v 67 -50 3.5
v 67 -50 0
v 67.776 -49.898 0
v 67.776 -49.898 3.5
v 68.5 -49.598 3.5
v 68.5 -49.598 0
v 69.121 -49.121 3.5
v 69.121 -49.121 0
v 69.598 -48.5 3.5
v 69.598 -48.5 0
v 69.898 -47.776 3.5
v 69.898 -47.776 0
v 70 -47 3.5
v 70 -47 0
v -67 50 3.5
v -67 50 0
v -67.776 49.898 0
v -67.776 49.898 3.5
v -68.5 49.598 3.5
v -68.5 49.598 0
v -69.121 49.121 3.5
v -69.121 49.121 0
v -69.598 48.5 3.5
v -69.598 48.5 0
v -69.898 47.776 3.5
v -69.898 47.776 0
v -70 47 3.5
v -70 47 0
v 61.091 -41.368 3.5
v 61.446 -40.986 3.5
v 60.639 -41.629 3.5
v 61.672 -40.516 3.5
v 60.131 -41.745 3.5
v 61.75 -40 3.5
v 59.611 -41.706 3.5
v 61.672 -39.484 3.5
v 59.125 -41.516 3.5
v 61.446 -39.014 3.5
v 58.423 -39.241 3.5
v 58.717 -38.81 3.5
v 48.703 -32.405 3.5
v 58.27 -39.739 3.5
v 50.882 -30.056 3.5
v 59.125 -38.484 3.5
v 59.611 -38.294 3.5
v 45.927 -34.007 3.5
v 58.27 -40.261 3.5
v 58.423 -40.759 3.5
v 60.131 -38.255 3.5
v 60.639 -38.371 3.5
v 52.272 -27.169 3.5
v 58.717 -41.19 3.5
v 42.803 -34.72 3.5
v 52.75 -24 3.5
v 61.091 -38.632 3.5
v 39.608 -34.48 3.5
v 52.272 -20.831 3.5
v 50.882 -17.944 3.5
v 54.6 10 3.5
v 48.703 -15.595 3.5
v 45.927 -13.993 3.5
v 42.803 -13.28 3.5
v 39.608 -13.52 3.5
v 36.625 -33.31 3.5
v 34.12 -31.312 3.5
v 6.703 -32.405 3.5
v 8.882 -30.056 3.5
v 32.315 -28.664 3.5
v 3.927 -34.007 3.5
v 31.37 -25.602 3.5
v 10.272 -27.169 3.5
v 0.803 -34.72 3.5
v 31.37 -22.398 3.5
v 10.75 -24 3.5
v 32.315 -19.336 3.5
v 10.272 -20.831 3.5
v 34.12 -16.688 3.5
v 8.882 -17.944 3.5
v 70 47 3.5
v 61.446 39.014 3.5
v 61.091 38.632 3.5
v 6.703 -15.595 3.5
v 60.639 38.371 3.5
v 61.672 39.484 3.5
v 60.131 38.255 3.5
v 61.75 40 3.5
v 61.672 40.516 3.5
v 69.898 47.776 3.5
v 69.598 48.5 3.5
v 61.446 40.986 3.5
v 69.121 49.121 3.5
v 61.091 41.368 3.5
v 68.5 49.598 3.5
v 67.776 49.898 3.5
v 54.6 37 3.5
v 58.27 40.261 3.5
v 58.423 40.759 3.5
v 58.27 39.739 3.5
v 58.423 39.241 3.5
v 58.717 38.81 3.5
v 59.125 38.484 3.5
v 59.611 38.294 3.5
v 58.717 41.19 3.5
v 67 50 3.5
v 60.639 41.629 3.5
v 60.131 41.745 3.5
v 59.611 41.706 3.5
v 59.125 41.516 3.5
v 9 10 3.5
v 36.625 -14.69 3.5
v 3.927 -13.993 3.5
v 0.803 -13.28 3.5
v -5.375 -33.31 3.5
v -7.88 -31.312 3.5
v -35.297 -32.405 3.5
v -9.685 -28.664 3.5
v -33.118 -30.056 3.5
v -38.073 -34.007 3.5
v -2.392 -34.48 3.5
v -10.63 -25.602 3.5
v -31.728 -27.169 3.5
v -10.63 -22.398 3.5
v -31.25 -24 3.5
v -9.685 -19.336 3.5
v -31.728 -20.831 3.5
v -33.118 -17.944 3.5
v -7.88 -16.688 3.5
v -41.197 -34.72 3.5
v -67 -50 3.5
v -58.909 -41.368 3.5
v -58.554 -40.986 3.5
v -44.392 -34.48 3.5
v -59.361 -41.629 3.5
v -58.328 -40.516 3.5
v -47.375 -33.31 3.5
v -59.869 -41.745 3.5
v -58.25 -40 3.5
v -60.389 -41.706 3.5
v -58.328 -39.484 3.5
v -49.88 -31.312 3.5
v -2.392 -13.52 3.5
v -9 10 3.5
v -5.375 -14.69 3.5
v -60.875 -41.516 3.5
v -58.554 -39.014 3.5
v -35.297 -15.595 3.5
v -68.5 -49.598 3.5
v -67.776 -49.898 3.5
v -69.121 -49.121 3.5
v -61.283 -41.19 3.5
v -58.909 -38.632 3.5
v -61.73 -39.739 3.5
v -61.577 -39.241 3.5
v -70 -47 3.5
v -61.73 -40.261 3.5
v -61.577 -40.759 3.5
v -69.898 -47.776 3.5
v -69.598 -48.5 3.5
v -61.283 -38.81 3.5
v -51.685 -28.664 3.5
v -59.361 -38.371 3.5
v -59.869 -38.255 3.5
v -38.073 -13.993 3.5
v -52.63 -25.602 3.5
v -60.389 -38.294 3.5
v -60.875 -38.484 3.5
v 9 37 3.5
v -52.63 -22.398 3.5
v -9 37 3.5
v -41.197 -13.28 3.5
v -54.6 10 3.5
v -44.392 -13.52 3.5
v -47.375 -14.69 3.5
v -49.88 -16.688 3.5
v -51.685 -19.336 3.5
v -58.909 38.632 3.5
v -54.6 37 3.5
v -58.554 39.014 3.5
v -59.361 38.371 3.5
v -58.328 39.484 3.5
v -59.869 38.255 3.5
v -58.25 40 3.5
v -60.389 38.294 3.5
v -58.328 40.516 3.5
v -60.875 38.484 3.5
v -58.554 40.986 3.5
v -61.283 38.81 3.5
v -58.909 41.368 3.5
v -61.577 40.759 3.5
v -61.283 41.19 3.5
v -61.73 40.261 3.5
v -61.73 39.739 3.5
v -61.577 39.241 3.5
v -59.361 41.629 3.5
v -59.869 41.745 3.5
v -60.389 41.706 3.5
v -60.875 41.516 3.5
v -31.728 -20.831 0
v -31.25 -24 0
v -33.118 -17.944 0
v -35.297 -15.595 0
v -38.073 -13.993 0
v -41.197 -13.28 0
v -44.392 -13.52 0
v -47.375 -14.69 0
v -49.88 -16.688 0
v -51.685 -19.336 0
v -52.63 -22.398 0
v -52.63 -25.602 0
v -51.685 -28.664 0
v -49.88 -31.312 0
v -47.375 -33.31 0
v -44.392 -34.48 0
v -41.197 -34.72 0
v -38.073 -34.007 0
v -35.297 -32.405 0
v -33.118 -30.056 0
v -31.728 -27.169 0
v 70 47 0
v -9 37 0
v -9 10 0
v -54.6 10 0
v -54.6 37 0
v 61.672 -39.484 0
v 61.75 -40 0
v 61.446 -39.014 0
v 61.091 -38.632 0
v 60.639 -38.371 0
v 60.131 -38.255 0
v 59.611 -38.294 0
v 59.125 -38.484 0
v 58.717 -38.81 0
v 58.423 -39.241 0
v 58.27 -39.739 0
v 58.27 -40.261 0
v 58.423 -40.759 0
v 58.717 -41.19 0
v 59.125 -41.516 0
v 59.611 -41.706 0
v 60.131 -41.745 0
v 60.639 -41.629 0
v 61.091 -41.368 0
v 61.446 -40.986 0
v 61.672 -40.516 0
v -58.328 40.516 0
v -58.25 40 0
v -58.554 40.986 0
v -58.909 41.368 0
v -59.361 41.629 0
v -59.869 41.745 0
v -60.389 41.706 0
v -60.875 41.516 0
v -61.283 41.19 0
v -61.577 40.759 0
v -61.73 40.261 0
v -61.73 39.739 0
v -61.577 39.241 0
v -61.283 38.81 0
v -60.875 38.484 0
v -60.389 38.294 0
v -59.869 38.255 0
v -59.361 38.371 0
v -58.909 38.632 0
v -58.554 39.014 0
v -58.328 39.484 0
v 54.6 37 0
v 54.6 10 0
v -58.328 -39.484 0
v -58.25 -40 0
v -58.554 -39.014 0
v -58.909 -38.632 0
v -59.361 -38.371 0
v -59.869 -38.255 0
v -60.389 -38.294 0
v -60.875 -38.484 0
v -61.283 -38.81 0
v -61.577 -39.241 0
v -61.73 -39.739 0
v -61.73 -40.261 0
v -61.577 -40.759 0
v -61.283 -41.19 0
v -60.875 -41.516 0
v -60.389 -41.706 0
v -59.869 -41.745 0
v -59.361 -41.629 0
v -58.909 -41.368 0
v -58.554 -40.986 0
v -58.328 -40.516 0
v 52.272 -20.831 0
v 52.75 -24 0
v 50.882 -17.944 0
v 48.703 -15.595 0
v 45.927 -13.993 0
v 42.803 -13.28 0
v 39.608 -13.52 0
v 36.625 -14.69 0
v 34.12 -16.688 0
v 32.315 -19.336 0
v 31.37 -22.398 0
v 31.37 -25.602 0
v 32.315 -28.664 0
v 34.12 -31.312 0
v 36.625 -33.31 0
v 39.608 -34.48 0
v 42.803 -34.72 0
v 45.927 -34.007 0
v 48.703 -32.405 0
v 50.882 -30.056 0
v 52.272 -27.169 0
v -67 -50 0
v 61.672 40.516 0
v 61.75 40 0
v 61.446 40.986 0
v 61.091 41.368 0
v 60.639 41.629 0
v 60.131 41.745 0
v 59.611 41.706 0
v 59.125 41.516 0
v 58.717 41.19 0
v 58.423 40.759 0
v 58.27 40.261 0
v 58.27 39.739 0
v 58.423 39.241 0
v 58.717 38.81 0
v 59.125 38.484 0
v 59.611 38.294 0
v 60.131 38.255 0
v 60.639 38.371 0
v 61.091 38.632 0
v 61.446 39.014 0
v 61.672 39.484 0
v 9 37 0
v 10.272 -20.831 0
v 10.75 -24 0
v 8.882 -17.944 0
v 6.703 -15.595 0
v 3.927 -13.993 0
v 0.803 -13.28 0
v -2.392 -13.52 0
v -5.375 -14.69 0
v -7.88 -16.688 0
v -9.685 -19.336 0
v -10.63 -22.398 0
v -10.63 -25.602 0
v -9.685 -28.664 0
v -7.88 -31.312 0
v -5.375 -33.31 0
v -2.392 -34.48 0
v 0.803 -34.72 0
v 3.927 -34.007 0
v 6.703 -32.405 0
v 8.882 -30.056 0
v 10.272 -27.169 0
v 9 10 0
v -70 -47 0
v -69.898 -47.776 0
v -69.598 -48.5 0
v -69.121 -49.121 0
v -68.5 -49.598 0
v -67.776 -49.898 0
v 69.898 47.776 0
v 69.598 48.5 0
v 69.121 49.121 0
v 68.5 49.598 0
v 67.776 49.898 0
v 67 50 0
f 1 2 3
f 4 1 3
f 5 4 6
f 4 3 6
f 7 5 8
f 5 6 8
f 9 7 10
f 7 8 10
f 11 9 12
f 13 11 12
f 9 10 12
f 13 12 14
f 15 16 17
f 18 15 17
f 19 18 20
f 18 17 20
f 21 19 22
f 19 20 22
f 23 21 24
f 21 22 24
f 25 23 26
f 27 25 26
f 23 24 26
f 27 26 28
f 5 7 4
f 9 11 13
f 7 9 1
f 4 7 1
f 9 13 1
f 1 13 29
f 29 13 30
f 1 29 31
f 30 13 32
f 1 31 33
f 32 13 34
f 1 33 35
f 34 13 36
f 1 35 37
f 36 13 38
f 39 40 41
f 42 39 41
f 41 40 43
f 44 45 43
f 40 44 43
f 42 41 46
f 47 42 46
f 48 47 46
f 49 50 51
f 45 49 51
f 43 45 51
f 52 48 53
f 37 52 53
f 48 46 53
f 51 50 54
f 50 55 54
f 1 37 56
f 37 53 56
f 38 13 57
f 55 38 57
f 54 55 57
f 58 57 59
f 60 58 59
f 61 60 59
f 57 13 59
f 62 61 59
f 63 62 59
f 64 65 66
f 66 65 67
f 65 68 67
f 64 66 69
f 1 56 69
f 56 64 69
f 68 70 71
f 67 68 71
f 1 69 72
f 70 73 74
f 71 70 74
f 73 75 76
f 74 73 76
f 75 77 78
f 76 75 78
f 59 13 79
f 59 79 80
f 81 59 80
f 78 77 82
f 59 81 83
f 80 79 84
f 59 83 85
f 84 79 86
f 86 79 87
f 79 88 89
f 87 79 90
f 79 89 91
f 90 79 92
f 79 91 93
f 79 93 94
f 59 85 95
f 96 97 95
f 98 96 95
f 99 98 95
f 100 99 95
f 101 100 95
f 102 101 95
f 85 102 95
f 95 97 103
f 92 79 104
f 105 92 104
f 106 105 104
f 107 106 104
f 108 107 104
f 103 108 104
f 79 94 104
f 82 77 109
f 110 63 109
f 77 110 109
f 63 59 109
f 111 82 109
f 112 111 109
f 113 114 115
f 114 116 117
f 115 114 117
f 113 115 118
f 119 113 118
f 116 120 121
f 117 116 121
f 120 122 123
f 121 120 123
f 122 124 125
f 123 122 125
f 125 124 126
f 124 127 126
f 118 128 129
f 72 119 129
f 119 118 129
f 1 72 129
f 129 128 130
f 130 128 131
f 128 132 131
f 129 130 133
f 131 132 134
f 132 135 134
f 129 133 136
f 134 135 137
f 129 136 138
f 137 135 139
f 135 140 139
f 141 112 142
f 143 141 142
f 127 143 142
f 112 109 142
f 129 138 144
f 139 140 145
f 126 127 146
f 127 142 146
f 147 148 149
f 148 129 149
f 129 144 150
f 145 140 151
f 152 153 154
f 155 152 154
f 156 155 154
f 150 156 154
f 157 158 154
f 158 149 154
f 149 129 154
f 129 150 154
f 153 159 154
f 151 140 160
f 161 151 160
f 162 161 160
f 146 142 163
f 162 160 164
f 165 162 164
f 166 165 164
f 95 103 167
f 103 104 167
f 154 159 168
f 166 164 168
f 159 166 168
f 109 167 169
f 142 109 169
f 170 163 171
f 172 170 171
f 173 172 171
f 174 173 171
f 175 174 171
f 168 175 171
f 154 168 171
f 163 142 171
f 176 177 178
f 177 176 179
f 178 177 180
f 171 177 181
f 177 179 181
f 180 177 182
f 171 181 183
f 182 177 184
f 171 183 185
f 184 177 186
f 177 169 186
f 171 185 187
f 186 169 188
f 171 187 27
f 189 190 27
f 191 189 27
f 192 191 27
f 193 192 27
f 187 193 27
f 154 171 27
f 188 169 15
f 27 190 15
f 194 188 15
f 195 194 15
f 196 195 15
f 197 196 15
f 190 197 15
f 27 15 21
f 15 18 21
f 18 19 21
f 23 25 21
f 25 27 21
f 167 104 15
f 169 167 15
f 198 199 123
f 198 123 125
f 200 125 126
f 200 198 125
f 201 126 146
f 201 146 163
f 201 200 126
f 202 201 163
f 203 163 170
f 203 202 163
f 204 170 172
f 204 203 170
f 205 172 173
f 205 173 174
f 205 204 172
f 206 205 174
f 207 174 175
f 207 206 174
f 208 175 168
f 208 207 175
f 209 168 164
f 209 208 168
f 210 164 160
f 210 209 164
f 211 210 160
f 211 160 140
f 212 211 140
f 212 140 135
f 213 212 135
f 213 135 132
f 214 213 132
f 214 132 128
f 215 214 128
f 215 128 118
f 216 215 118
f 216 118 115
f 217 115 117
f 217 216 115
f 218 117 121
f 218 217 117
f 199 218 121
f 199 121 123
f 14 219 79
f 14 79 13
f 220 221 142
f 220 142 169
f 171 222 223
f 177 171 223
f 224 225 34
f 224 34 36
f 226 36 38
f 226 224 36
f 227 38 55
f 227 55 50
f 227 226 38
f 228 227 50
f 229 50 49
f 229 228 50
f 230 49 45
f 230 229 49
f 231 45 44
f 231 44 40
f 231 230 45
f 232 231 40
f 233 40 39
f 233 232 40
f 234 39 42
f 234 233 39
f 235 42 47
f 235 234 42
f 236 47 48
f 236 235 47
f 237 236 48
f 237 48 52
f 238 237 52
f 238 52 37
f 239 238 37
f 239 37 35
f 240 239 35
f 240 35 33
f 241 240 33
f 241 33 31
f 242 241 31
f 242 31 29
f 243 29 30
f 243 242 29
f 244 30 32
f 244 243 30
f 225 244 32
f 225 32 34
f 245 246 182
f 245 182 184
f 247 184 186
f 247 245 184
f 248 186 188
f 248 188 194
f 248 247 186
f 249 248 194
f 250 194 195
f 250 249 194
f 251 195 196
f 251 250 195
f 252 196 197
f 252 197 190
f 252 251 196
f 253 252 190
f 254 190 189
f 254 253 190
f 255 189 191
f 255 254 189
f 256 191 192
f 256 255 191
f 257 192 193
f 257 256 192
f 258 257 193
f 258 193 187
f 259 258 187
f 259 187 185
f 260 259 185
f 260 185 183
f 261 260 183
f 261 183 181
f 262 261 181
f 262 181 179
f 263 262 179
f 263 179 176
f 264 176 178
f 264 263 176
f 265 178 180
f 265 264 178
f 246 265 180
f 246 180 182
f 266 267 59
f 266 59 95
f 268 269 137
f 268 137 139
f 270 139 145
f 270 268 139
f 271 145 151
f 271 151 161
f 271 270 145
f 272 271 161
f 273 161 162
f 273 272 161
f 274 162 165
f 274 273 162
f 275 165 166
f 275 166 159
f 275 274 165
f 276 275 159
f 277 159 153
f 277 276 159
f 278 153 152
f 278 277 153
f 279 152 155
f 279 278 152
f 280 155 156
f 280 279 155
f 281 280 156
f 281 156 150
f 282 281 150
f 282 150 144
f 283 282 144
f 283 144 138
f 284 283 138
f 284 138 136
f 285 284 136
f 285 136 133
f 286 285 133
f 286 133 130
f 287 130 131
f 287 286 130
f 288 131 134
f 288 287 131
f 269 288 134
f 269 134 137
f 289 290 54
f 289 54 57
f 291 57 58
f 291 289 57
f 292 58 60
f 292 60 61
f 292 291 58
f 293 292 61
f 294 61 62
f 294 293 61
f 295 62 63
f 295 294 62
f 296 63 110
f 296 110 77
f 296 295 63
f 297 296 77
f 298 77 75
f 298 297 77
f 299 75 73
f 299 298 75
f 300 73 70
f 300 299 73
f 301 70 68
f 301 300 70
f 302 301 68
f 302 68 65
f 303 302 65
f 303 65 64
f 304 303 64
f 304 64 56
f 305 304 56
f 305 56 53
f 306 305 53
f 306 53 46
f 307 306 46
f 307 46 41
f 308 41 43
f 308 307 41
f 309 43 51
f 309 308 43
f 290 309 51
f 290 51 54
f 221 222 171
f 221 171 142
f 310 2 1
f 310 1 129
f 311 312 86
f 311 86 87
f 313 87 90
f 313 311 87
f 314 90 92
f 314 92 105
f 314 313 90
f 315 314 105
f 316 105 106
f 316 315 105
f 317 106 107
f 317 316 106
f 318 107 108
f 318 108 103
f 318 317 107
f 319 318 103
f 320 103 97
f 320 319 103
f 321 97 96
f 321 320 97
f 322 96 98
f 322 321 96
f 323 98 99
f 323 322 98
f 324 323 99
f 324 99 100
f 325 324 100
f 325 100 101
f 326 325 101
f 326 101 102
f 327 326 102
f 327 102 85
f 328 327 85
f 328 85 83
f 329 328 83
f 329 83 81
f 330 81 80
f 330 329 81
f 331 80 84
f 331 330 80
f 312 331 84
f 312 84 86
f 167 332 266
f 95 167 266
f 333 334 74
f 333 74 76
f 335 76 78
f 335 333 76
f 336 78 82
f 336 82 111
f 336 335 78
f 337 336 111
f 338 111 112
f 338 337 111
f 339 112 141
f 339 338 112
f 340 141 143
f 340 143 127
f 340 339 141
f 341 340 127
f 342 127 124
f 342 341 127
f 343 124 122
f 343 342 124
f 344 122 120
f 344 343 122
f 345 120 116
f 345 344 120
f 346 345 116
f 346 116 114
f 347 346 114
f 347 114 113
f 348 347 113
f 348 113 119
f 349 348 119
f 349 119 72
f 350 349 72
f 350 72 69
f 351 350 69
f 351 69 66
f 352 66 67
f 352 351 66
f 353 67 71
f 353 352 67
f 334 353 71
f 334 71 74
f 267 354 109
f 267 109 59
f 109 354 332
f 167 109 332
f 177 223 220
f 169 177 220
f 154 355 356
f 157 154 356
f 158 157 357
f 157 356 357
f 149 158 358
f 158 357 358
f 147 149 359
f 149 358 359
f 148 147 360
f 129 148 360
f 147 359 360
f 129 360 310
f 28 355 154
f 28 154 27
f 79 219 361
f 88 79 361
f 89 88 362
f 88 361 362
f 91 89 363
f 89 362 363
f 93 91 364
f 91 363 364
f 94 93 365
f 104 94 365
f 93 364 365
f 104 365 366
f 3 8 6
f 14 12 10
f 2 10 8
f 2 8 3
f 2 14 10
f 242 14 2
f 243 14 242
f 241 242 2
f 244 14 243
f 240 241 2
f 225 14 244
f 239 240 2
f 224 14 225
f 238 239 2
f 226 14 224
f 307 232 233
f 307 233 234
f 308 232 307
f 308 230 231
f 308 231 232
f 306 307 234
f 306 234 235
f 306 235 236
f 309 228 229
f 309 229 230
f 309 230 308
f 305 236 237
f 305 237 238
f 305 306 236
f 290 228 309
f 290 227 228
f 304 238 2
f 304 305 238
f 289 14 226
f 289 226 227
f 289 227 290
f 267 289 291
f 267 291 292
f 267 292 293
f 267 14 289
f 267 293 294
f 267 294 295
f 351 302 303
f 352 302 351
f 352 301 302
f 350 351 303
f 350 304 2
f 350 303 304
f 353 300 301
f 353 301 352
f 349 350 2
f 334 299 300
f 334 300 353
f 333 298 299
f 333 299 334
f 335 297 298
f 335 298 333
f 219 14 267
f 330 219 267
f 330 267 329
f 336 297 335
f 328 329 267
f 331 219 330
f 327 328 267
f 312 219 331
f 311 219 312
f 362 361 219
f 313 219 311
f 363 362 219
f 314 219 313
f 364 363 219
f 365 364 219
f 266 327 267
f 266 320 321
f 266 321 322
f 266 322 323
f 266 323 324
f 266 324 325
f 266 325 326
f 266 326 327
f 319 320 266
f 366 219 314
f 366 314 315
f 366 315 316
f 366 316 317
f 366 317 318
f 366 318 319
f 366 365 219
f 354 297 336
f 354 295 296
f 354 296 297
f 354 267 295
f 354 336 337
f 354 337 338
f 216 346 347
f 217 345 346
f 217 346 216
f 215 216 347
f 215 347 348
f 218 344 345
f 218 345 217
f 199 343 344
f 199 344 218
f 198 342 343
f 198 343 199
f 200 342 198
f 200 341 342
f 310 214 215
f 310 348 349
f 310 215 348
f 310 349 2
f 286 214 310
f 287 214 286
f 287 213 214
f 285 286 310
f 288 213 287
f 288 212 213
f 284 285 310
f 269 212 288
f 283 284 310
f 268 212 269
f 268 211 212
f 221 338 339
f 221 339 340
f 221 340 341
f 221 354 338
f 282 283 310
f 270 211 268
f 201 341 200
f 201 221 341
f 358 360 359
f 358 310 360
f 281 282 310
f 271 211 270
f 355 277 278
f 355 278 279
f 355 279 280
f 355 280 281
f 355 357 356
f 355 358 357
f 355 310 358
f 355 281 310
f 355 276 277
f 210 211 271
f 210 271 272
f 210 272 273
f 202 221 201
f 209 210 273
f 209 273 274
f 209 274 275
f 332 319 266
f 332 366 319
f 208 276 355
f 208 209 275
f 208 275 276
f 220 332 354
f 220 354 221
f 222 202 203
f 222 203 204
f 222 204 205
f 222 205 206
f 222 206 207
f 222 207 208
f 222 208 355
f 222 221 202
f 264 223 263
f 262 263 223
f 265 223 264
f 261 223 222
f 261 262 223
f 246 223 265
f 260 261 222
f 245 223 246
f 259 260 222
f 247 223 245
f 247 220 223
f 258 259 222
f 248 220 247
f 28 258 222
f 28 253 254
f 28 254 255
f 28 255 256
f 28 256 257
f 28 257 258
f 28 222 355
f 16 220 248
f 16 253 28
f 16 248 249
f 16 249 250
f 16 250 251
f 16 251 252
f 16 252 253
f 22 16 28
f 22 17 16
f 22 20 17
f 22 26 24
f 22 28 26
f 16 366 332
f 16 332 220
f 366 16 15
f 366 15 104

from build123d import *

# Parameters (mm, degrees)
SKETCH_R   = 10.75
SKETCH_R_2 = 1.75
SKETCH_W   = 45.6
SKETCH_H   = 27
PAD_DEPTH  = 3.5


with BuildPart() as part:
    # Sketch → Pad (new body)
    with BuildSketch(Plane.XY):
        with BuildLine():
            Line((-67, 50), (67, 50))
            ThreePointArc((70, 47), (69.12132, 49.12132), (67, 50))
            Line((70, 47), (70, -47))
            ThreePointArc((67, -50), (69.12132, -49.12132), (70, -47))
            Line((67, -50), (-67, -50))
            ThreePointArc((-70, -47), (-69.12132, -49.12132), (-67, -50))
            Line((-70, -47), (-70, 47))
            ThreePointArc((-67, 50), (-69.12132, 49.12132), (-70, 47))
        make_face()
        with Locations((-42, -24)):
            Circle(SKETCH_R, mode=Mode.SUBTRACT)
        with Locations((42, -24)):
            Circle(SKETCH_R, mode=Mode.SUBTRACT)
        with Locations((-60, 40)):
            Circle(SKETCH_R_2, mode=Mode.SUBTRACT)
        with Locations((60, 40)):
            Circle(SKETCH_R_2, mode=Mode.SUBTRACT)
        with Locations((-60, -40)):
            Circle(SKETCH_R_2, mode=Mode.SUBTRACT)
        with Locations((60, -40)):
            Circle(SKETCH_R_2, mode=Mode.SUBTRACT)
        with Locations((0, -24)):
            Circle(SKETCH_R, mode=Mode.SUBTRACT)
        with Locations((-31.8, 23.5)):
            Rectangle(SKETCH_W, SKETCH_H, mode=Mode.SUBTRACT)
        with Locations((31.8, 23.5)):
            Rectangle(SKETCH_W, SKETCH_H, mode=Mode.SUBTRACT)
    extrude(amount=PAD_DEPTH)


solid = part.part
